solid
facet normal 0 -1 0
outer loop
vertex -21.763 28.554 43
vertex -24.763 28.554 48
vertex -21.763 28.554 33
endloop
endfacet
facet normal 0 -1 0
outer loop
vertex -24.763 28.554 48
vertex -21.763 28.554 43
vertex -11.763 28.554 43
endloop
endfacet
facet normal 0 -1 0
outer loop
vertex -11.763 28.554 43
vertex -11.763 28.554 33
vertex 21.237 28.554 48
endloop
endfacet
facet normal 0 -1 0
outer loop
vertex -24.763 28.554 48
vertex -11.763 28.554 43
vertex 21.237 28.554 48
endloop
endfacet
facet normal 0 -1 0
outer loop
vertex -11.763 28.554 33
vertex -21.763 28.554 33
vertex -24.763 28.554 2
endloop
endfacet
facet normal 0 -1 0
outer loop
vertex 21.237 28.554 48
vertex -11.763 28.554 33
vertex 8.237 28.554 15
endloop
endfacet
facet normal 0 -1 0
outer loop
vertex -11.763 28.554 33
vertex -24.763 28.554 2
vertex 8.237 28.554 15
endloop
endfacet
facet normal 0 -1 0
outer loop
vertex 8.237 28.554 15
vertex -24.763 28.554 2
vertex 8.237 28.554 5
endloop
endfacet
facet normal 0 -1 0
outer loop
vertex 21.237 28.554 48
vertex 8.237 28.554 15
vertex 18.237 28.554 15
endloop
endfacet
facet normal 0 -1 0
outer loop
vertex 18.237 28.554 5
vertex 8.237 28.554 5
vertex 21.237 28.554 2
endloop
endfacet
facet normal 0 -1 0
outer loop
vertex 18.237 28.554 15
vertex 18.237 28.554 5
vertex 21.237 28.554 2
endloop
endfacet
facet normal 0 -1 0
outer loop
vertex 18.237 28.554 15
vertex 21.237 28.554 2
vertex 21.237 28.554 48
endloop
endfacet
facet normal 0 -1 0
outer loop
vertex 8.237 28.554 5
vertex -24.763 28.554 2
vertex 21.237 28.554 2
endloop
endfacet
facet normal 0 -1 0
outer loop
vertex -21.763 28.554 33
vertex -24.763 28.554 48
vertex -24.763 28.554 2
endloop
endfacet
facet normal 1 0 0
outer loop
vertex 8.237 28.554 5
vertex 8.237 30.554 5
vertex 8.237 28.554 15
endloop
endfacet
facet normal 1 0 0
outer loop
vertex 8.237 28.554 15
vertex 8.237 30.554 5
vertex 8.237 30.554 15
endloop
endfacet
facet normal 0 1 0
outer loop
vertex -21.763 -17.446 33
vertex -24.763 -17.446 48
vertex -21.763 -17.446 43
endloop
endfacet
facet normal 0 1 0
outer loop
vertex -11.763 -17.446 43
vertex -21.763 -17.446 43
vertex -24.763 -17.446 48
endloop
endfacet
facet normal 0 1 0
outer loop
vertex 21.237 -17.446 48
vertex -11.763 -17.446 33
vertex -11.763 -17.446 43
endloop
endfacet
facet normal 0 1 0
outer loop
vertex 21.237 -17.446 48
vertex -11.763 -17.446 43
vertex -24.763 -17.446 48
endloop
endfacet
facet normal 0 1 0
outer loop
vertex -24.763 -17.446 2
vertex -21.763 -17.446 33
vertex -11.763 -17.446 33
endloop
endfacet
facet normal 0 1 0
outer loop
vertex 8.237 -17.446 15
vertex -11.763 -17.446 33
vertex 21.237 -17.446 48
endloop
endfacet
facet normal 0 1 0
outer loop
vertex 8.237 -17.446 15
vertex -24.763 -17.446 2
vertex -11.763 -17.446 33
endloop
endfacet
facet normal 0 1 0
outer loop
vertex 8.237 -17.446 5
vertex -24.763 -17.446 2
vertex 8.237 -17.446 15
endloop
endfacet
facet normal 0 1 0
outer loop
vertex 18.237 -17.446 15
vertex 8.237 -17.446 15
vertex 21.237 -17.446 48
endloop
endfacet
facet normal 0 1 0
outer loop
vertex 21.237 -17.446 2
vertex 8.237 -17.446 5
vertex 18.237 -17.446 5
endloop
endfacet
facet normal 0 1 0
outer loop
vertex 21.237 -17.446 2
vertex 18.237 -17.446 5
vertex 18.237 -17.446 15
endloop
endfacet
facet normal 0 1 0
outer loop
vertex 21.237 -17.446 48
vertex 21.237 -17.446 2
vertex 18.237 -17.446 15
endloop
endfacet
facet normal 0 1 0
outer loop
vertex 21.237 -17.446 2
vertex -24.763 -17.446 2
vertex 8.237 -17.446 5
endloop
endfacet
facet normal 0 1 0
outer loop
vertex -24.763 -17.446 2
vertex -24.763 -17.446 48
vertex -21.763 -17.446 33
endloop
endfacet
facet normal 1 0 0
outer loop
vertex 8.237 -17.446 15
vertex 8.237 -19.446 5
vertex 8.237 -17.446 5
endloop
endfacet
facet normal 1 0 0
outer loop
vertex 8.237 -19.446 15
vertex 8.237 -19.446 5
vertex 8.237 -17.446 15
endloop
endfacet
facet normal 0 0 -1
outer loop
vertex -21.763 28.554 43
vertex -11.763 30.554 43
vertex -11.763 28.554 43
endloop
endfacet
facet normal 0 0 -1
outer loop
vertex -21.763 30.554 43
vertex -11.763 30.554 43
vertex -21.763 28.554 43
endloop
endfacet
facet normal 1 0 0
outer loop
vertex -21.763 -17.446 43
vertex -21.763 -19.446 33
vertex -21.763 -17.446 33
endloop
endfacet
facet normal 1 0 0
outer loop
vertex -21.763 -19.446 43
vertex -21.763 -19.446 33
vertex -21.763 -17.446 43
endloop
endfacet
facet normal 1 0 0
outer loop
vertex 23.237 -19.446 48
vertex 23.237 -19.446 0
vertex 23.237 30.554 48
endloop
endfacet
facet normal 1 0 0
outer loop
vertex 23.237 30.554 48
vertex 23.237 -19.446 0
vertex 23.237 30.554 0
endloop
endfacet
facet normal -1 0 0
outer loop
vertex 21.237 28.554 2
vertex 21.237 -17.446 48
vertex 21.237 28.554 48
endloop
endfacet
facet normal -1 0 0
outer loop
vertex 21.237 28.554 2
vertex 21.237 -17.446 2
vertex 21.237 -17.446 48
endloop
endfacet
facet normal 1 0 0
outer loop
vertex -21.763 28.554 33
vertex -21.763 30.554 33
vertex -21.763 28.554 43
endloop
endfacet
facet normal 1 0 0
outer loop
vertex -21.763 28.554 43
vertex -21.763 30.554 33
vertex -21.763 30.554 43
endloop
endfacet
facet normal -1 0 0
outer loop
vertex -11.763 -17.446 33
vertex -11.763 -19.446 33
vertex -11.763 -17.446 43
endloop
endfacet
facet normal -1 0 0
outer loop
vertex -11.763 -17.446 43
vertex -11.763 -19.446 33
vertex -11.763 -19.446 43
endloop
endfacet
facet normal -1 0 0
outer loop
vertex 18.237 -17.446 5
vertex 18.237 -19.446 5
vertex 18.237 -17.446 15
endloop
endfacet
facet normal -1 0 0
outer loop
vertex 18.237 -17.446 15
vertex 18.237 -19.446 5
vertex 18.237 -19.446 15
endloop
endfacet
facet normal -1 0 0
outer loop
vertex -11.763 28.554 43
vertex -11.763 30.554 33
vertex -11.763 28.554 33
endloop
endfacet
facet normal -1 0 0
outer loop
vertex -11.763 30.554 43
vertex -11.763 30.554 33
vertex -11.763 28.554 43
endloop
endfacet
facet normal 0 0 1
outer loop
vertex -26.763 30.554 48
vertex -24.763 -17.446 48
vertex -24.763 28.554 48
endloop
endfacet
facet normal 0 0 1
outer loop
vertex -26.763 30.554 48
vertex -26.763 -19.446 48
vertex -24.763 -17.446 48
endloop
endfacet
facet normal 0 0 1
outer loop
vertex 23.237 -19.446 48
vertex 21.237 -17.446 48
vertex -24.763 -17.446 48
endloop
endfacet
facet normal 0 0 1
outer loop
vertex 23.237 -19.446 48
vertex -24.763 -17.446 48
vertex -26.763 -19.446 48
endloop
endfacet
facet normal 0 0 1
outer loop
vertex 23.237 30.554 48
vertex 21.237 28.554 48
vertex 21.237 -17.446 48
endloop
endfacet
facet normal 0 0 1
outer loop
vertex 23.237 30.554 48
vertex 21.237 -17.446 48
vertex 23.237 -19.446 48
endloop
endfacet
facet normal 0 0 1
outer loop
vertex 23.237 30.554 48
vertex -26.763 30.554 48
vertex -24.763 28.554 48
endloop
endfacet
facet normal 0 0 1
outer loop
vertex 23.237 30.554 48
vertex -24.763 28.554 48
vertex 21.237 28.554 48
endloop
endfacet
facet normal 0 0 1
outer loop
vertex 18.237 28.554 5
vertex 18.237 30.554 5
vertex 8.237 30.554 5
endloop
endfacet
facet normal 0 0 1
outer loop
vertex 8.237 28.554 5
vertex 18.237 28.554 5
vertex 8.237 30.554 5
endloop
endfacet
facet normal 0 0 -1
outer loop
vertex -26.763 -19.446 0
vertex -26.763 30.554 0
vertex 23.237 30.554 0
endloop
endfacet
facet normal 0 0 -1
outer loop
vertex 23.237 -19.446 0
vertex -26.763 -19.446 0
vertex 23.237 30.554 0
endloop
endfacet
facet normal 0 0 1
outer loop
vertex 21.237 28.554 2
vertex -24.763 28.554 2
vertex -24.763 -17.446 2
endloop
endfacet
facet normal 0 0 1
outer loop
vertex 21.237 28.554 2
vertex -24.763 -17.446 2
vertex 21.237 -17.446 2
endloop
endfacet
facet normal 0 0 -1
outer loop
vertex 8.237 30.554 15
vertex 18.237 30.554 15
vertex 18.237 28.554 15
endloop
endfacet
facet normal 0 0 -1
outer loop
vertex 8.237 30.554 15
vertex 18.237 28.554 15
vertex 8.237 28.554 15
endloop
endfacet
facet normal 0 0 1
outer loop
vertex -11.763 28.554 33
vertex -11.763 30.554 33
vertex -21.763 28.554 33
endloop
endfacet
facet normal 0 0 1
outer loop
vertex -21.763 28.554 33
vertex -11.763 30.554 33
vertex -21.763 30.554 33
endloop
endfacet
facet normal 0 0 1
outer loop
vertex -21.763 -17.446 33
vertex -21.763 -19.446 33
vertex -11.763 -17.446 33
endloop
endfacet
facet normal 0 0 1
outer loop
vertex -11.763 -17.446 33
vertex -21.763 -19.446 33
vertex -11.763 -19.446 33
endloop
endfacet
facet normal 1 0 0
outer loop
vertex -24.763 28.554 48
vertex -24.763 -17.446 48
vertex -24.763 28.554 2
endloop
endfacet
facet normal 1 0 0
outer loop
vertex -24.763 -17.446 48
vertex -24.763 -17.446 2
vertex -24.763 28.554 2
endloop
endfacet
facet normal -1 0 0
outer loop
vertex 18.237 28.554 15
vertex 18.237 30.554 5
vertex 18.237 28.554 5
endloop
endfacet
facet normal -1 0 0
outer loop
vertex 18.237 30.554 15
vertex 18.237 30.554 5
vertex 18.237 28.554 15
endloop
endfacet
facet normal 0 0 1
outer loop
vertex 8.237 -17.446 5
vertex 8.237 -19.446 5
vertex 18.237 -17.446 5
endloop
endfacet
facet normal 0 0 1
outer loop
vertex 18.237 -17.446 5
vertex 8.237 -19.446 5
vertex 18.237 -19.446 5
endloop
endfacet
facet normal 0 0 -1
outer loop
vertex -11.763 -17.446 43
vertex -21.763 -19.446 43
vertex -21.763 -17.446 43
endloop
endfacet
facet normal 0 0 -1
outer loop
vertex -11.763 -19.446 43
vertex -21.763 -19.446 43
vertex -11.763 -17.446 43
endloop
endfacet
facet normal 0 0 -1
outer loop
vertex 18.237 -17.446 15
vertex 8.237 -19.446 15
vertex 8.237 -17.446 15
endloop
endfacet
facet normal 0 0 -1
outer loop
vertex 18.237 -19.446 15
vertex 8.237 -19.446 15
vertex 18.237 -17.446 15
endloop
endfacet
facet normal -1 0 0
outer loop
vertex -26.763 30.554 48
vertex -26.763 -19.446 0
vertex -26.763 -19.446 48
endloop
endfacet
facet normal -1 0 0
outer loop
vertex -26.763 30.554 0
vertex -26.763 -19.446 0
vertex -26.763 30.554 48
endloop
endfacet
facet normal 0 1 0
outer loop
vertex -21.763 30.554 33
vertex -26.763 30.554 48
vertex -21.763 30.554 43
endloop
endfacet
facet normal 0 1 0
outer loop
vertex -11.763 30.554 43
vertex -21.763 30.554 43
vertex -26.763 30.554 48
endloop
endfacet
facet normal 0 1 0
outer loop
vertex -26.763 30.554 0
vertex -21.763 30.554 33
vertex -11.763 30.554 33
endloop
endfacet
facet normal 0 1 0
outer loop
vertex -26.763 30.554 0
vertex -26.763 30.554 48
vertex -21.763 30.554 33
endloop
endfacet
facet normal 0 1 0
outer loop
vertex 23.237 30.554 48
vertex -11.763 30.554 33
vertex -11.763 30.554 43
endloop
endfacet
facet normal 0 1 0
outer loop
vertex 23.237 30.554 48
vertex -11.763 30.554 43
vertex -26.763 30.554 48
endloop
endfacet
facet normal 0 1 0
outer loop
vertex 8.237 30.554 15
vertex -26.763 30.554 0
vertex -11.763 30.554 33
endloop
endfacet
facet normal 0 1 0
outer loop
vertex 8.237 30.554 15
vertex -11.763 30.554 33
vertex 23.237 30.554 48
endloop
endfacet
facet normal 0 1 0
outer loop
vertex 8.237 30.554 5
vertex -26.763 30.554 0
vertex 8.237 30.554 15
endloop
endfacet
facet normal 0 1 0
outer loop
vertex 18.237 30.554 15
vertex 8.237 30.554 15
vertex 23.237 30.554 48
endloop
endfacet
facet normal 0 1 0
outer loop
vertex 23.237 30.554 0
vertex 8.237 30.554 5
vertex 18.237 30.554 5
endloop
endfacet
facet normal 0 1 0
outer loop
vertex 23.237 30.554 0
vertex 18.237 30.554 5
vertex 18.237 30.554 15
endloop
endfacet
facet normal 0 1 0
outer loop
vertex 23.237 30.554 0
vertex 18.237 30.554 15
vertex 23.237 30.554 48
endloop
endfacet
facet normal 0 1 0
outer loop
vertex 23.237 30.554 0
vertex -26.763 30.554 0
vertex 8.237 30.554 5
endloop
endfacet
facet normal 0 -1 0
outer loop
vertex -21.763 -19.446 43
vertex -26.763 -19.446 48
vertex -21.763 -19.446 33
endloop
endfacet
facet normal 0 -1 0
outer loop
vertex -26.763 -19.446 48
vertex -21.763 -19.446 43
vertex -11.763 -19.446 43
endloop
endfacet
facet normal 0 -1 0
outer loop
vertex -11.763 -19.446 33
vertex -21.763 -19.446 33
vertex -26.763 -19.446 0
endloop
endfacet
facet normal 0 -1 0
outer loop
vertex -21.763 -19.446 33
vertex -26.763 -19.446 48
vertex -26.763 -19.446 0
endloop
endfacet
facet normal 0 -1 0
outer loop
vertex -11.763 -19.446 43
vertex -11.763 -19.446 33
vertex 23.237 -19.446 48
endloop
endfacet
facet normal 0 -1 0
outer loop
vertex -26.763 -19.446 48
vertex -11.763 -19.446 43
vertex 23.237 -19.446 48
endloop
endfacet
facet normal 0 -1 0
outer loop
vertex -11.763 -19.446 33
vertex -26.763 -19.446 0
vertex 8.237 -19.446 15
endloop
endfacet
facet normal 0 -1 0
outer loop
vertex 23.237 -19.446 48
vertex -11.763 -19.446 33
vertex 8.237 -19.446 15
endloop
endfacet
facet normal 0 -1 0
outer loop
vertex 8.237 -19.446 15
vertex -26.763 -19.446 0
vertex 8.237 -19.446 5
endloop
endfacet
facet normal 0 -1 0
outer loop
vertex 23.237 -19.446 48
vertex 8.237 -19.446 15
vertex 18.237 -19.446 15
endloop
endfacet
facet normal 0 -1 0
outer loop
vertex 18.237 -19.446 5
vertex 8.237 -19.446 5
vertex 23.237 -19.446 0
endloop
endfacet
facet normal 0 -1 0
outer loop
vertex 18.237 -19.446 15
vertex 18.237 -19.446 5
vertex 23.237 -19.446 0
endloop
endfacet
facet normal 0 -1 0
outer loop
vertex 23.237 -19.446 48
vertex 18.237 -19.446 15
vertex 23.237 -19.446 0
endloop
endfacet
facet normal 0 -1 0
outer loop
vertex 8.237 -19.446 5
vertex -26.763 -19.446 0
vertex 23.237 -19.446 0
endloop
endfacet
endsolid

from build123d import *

# Parameters (mm, degrees)
F0_W     = 50
F0_H     = 50
F1_DEPTH = 48
F2_T     = -2
F3_W     = 10
F3_H     = 10
F5_DEPTH = 2
F4_W     = 10
F4_H     = 10
F6_DEPTH = 2


with BuildPart() as f1:
    # F0 (on Top) → F1 (new body)
    with BuildSketch(Plane.XY):
        with Locations((-1.763418, 5.553549)):
            Rectangle(F0_W, F0_H)
    extrude(amount=F1_DEPTH)

    # F2
    f2_openings = [f1.faces().sort_by_distance(p)[0] for p in [
        (-1.763418, 5.553549, 48),
    ]]
    offset(amount=F2_T, openings=f2_openings)

    # F3 (on face) → F5 (cut)
    with BuildSketch(Plane.XZ.offset(19.446451)):
        with Locations((-16.763418, 38)):
            Rectangle(F3_W, F3_H)
        with Locations((13.236582, 10)):
            Rectangle(F3_W, F3_H)
    extrude(amount=-F5_DEPTH, mode=Mode.SUBTRACT)

    # F4 (on face) → F6 (cut)
    with BuildSketch(Plane(origin=(0, 30.553549, 0), x_dir=(-1, 0, 0), z_dir=(0, 1, 0))):
        with Locations((16.763418, 38)):
            Rectangle(F4_W, F4_H)
        with Locations((-13.236582, 10)):
            Rectangle(F4_W, F4_H)
    extrude(amount=-F6_DEPTH, mode=Mode.SUBTRACT)


solid = f1.part
